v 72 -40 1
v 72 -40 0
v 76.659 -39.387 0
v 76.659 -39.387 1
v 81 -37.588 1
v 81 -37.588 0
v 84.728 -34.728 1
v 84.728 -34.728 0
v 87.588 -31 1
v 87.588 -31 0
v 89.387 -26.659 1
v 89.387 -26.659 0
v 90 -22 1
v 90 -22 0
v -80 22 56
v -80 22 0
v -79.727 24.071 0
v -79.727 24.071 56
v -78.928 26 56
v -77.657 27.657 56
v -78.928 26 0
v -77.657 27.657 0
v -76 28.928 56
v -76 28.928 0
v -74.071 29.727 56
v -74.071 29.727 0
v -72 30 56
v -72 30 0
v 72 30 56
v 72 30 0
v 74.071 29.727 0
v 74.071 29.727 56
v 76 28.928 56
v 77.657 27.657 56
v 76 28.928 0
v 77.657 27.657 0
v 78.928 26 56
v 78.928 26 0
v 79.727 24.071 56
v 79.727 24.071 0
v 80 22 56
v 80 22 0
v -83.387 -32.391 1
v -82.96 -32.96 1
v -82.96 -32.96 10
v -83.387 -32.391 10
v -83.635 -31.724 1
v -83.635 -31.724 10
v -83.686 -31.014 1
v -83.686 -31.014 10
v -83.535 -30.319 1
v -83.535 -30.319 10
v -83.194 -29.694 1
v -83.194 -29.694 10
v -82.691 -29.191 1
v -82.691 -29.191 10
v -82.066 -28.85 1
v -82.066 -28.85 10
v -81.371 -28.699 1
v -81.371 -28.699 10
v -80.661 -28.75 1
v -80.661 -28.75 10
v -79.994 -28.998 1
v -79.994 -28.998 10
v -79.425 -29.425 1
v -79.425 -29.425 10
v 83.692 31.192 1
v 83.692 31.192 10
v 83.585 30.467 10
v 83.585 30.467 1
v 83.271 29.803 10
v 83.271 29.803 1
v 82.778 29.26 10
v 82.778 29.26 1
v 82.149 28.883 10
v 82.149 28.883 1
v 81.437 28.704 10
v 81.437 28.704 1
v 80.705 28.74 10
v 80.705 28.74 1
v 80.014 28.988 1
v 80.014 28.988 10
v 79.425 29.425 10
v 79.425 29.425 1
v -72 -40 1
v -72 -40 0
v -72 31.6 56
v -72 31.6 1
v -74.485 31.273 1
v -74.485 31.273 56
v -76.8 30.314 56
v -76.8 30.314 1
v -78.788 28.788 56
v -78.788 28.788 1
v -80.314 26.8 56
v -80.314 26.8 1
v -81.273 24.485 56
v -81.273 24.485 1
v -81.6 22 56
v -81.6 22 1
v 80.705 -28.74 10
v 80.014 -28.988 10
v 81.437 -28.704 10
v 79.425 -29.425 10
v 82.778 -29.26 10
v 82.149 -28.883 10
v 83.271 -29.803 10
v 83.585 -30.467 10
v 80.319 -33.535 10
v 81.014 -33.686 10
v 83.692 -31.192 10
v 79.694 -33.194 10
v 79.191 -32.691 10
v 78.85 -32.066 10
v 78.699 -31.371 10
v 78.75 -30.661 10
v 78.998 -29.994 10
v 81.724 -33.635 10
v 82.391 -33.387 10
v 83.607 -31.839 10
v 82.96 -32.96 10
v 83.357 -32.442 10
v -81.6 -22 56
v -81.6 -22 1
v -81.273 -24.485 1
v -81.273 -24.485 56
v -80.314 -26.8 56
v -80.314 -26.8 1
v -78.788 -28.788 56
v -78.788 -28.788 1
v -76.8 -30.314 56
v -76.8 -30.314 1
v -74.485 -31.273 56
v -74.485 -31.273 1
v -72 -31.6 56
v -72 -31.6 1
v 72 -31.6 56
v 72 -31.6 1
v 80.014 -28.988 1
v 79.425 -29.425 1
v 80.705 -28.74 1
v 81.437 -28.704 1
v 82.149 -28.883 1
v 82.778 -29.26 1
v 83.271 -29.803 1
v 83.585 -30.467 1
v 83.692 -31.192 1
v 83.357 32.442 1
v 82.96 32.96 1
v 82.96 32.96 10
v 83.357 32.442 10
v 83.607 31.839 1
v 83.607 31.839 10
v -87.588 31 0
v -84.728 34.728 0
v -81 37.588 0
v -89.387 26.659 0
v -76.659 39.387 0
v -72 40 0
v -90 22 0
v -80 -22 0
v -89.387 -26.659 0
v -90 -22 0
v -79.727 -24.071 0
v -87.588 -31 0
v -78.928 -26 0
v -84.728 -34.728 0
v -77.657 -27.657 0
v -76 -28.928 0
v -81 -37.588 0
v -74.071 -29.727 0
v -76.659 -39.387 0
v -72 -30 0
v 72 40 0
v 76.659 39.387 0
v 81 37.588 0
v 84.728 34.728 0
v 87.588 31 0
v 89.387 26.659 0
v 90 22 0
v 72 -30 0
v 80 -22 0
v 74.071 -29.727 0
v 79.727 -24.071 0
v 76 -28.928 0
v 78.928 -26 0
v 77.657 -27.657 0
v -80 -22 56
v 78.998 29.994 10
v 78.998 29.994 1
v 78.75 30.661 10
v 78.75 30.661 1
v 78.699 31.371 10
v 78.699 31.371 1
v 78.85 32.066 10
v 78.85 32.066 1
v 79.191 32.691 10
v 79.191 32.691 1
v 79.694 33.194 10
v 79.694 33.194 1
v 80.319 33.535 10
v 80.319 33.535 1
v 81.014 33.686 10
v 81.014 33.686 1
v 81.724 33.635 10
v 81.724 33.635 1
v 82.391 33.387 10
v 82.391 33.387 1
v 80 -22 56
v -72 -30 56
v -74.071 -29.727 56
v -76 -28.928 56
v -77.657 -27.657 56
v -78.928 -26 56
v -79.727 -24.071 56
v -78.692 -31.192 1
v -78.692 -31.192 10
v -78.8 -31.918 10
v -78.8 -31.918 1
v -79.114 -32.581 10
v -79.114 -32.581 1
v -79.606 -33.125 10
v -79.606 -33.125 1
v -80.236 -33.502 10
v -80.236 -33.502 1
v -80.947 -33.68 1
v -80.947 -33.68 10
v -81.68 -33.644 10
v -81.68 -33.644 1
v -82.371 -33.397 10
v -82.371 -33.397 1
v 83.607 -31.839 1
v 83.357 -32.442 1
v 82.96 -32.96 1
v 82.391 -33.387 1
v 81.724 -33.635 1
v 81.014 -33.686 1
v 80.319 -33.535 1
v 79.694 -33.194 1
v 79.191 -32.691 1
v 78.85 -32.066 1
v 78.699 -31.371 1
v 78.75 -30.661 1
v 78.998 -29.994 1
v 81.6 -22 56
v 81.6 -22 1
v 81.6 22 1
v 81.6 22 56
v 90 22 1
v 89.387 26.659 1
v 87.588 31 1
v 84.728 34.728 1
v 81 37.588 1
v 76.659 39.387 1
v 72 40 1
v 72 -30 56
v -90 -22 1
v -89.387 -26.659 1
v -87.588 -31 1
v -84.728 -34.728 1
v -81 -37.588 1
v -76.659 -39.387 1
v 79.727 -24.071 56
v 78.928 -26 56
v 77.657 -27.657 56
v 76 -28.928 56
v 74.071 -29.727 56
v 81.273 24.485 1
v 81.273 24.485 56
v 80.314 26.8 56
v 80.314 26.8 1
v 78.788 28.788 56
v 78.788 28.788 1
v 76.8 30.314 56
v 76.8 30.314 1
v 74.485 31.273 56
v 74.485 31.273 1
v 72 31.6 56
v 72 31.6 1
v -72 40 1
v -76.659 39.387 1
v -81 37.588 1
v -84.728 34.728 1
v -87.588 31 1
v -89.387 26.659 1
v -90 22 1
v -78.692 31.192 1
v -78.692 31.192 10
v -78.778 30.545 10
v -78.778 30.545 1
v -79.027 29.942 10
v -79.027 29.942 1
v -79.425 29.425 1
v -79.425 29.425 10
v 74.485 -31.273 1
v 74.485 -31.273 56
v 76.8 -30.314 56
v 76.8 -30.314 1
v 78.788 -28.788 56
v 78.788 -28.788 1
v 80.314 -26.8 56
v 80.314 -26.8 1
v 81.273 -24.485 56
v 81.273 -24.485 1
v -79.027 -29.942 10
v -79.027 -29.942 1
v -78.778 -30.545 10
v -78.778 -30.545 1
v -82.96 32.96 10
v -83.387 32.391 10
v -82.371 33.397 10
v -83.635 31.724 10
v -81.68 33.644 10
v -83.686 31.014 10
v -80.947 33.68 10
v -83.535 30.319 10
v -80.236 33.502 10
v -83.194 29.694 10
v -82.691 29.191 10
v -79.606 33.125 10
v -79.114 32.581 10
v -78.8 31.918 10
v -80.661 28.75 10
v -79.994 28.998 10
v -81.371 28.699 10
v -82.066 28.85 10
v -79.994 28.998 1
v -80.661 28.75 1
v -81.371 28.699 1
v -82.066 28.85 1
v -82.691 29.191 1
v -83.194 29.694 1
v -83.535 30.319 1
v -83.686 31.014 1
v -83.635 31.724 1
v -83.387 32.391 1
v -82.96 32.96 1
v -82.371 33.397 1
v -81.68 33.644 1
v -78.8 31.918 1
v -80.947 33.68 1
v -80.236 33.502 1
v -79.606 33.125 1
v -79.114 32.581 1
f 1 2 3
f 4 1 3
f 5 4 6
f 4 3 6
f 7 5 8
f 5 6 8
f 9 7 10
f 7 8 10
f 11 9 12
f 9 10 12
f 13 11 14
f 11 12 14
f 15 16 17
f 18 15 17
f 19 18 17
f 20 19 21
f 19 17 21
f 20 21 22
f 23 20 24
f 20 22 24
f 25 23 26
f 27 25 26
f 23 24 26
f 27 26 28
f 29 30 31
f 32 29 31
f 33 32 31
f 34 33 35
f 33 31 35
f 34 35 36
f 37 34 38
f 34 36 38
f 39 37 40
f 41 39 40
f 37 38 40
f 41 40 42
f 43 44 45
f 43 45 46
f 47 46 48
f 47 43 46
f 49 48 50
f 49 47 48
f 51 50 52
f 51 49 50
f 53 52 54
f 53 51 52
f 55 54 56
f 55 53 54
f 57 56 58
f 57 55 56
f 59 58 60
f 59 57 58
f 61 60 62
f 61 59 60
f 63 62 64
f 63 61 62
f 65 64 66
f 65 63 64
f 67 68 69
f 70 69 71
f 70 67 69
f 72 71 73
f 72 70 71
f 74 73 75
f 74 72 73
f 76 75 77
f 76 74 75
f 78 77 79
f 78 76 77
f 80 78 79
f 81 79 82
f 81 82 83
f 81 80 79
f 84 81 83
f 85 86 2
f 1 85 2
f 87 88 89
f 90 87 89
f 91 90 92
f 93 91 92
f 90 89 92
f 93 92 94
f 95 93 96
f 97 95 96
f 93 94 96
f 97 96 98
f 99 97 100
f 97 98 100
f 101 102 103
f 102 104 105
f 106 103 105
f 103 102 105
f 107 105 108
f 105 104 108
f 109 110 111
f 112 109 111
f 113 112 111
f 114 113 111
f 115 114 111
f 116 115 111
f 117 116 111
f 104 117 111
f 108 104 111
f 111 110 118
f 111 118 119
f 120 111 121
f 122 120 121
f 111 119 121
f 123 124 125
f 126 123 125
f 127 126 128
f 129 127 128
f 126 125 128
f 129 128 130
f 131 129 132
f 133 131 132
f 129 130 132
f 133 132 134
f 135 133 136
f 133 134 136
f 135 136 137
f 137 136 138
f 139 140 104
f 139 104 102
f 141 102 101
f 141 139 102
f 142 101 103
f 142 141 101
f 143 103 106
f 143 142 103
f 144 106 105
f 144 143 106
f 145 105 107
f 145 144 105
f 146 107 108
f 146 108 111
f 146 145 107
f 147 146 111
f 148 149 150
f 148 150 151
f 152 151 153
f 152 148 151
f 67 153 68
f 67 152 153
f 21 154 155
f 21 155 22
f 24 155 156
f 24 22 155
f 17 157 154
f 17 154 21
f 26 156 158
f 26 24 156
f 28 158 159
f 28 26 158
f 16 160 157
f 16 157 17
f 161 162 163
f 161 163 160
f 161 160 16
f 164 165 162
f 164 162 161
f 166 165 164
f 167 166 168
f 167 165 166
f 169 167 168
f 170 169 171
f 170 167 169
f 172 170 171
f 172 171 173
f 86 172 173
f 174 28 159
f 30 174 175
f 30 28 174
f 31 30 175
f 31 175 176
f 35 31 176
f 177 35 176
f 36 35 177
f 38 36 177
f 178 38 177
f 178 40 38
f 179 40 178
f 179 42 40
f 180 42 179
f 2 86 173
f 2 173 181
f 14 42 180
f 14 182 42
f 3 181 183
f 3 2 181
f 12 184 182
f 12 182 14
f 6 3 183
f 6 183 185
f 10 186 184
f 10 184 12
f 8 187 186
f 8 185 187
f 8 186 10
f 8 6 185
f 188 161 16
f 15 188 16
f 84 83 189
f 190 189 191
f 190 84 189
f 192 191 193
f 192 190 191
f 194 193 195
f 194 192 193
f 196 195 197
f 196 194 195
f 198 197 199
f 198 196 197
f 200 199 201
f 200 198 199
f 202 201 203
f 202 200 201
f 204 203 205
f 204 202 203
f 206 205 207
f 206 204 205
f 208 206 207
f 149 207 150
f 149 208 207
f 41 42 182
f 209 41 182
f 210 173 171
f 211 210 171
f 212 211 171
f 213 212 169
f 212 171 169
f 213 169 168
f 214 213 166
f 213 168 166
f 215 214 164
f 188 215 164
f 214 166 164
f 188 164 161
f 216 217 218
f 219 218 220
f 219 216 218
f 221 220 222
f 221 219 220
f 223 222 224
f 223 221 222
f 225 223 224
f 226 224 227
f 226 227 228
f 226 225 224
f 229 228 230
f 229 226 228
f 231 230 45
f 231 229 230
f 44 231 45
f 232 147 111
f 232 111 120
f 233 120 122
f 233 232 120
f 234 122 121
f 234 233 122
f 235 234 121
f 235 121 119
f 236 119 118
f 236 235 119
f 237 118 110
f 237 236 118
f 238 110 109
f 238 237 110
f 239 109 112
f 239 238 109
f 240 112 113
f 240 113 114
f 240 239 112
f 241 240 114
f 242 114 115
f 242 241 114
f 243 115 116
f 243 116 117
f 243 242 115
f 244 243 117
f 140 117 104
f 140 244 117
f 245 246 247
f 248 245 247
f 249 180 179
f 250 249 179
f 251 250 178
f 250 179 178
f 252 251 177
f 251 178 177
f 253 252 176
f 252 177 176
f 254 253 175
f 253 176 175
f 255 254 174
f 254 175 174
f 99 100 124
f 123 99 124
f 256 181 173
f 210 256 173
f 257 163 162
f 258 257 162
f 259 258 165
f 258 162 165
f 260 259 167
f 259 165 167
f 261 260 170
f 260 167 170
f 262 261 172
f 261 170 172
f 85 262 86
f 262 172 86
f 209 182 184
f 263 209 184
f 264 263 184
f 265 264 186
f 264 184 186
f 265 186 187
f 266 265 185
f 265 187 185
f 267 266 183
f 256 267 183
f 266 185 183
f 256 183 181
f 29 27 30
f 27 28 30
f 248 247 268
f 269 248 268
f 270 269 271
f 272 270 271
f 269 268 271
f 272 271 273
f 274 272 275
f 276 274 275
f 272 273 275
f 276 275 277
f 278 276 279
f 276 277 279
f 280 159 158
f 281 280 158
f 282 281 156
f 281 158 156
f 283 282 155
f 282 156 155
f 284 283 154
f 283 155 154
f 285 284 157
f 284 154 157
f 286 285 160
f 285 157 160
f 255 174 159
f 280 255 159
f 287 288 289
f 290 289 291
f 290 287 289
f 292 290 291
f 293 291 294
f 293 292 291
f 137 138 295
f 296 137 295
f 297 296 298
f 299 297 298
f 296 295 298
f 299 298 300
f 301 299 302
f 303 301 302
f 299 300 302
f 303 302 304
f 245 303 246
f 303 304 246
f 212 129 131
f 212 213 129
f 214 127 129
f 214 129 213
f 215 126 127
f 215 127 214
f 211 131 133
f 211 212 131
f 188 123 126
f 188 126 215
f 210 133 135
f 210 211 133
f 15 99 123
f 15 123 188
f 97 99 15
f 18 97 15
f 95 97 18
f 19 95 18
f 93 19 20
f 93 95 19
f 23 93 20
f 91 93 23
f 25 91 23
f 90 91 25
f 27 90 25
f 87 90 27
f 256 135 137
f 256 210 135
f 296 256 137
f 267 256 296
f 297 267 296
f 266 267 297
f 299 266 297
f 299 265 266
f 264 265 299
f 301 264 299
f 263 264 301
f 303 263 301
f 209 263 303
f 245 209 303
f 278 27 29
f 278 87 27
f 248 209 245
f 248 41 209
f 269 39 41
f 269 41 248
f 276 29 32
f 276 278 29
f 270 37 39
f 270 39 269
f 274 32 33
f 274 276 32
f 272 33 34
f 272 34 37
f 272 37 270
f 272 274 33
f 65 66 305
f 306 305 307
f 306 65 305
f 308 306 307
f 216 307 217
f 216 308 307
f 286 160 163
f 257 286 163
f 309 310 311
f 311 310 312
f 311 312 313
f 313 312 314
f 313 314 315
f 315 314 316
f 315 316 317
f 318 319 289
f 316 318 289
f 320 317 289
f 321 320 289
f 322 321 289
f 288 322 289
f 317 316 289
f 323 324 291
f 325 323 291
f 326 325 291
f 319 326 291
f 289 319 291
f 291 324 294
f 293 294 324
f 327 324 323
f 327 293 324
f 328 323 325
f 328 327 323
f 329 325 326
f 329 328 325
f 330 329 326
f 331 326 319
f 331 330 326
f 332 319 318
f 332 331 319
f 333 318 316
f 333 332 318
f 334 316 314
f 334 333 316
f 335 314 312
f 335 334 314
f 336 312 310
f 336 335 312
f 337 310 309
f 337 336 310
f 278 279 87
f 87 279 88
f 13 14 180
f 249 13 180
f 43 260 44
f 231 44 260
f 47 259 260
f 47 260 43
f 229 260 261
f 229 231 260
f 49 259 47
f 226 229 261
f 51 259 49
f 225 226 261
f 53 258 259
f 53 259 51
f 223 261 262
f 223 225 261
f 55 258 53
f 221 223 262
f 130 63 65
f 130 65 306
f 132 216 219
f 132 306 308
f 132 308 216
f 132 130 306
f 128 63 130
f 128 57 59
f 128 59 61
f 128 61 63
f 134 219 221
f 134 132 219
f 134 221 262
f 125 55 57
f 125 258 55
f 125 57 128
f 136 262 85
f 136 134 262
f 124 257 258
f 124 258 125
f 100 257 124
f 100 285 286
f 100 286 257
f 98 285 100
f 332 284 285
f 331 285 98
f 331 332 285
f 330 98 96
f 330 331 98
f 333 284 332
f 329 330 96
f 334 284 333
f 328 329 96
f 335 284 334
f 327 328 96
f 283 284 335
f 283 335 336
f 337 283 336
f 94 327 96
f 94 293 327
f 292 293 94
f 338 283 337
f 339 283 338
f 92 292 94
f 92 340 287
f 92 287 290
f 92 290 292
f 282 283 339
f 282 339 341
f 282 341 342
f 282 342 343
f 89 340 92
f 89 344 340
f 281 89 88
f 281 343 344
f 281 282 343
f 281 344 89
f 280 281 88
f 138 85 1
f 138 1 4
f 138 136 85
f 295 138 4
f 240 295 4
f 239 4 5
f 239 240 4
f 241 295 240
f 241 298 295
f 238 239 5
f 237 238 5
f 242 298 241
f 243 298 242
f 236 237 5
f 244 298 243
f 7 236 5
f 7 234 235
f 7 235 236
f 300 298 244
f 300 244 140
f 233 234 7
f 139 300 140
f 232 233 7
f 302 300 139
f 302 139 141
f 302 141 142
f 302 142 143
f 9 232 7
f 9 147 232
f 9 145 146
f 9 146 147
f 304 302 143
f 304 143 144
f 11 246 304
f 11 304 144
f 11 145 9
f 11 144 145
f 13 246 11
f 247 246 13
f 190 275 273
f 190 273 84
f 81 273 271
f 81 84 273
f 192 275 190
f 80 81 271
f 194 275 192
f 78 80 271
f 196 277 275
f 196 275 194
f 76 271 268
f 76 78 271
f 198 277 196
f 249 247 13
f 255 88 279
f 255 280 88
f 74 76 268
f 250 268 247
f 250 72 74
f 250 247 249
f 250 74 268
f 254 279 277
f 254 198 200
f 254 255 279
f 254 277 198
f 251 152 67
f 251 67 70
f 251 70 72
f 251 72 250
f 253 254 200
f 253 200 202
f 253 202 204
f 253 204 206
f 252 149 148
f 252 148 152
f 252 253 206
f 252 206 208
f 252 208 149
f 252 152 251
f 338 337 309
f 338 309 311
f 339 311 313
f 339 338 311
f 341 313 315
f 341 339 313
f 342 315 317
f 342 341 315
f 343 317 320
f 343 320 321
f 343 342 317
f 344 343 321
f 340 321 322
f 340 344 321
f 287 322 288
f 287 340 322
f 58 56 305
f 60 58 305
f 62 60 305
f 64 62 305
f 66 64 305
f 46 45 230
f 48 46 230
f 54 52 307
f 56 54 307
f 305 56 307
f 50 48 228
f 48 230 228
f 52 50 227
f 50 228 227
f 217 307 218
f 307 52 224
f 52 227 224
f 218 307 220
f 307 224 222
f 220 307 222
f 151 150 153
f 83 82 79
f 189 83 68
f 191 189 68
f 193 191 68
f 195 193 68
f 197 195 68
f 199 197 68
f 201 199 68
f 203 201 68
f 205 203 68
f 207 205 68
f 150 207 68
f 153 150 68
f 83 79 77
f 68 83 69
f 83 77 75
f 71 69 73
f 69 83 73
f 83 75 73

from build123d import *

# Parameters (mm, degrees)
F1_DEPTH = 1
F3_DEPTH = 55
F5_DEPTH = 10


with BuildPart() as f1:
    # F0 (on Top) → F1 (new body)
    with BuildSketch(Plane.XY):
        with BuildLine():
            Line((-72, -40), (72, -40))
            ThreePointArc((72, -40), (84.727922, -34.727922), (90, -22))
            Line((90, -22), (90, 22))
            ThreePointArc((90, 22), (84.727922, 34.727922), (72, 40))
            Line((72, 40), (-72, 40))
            ThreePointArc((-72, 40), (-84.727922, 34.727922), (-90, 22))
            Line((-90, 22), (-90, -22))
            ThreePointArc((-90, -22), (-84.727922, -34.727922), (-72, -40))
        make_face()
        with BuildLine():
            Line((-72, 30), (72, 30))
            ThreePointArc((72, 30), (77.656854, 27.656854), (80, 22))
            Line((80, 22), (80, -22))
            ThreePointArc((80, -22), (77.656854, -27.656854), (72, -30))
            Line((72, -30), (-72, -30))
            ThreePointArc((-72, -30), (-77.656854, -27.656854), (-80, -22))
            Line((-80, -22), (-80, 22))
            ThreePointArc((-80, 22), (-77.656854, 27.656854), (-72, 30))
        make_face(mode=Mode.SUBTRACT)
    extrude(amount=F1_DEPTH)

    # F2 (on face) → F3 (join)
    with BuildSketch(Plane.XY.offset(1)):
        with BuildLine():
            Line((81.6, -22), (81.6, 22))
            ThreePointArc((81.6, 22), (78.788225, 28.788225), (72, 31.6))
            Line((72, 31.6), (-72, 31.6))
            ThreePointArc((-72, 31.6), (-78.788225, 28.788225), (-81.6, 22))
            Line((-81.6, 22), (-81.6, -22))
            ThreePointArc((-81.6, -22), (-78.788225, -28.788225), (-72, -31.6))
            Line((-72, -31.6), (72, -31.6))
            ThreePointArc((72, -31.6), (78.788225, -28.788225), (81.6, -22))
        make_face()
        with BuildLine():
            Line((-72, 30), (72, 30))
            ThreePointArc((72, 30), (77.656854, 27.656854), (80, 22))
            Line((80, 22), (80, -22))
            ThreePointArc((80, -22), (77.656854, -27.656854), (72, -30))
            Line((72, -30), (-72, -30))
            ThreePointArc((-72, -30), (-77.656854, -27.656854), (-80, -22))
            Line((-80, -22), (-80, 22))
            ThreePointArc((-80, 22), (-77.656854, 27.656854), (-72, 30))
        make_face(mode=Mode.SUBTRACT)
    extrude(amount=F3_DEPTH)

    # F4 (on face) → F5 (join)
    with BuildSketch(Plane(origin=(0, 0, 0), x_dir=(1, 0, 0), z_dir=(0, 0, -1))):
        with BuildLine():
            ThreePointArc((-78.692388, -31.192388), (-78.882689, -30.23568), (-79.424621, -29.424621))
            Line((-79.424621, -29.424621), (-82.960155, -32.960155))
            ThreePointArc((-82.960155, -32.960155), (-80.23568, -33.502087), (-78.692388, -31.192388))
        make_face()
        with BuildLine():
            Line((-82.960155, -32.960155), (-79.424621, -29.424621))
            ThreePointArc((-79.424621, -29.424621), (-82.960155, -29.424621), (-82.960155, -32.960155))
        make_face()
        with BuildLine():
            ThreePointArc((83.692388, -31.192388), (82.149097, -28.882689), (79.424621, -29.424621))
            Line((79.424621, -29.424621), (82.960155, -32.960155))
            ThreePointArc((82.960155, -32.960155), (83.502087, -32.149097), (83.692388, -31.192388))
        make_face()
        with BuildLine():
            Line((82.960155, -32.960155), (79.424621, -29.424621))
            ThreePointArc((79.424621, -29.424621), (79.424621, -32.960155), (82.960155, -32.960155))
        make_face()
        with BuildLine():
            ThreePointArc((82.960155, 32.960155), (79.424621, 32.960155), (79.424621, 29.424621))
            Line((79.424621, 29.424621), (82.960155, 32.960155))
        make_face()
        with BuildLine():
            Line((82.960155, 32.960155), (79.424621, 29.424621))
            ThreePointArc((79.424621, 29.424621), (82.149097, 28.882689), (83.692388, 31.192388))
            ThreePointArc((83.692388, 31.192388), (83.502087, 32.149097), (82.960155, 32.960155))
        make_face()
        with BuildLine():
            ThreePointArc((-82.960155, 32.960155), (-82.960155, 29.424621), (-79.424621, 29.424621))
            Line((-79.424621, 29.424621), (-82.960155, 32.960155))
        make_face()
        with BuildLine():
            Line((-82.960155, 32.960155), (-79.424621, 29.424621))
            ThreePointArc((-79.424621, 29.424621), (-78.882689, 30.23568), (-78.692388, 31.192388))
            ThreePointArc((-78.692388, 31.192388), (-80.23568, 33.502087), (-82.960155, 32.960155))
        make_face()
    extrude(amount=-F5_DEPTH)


solid = f1.part
